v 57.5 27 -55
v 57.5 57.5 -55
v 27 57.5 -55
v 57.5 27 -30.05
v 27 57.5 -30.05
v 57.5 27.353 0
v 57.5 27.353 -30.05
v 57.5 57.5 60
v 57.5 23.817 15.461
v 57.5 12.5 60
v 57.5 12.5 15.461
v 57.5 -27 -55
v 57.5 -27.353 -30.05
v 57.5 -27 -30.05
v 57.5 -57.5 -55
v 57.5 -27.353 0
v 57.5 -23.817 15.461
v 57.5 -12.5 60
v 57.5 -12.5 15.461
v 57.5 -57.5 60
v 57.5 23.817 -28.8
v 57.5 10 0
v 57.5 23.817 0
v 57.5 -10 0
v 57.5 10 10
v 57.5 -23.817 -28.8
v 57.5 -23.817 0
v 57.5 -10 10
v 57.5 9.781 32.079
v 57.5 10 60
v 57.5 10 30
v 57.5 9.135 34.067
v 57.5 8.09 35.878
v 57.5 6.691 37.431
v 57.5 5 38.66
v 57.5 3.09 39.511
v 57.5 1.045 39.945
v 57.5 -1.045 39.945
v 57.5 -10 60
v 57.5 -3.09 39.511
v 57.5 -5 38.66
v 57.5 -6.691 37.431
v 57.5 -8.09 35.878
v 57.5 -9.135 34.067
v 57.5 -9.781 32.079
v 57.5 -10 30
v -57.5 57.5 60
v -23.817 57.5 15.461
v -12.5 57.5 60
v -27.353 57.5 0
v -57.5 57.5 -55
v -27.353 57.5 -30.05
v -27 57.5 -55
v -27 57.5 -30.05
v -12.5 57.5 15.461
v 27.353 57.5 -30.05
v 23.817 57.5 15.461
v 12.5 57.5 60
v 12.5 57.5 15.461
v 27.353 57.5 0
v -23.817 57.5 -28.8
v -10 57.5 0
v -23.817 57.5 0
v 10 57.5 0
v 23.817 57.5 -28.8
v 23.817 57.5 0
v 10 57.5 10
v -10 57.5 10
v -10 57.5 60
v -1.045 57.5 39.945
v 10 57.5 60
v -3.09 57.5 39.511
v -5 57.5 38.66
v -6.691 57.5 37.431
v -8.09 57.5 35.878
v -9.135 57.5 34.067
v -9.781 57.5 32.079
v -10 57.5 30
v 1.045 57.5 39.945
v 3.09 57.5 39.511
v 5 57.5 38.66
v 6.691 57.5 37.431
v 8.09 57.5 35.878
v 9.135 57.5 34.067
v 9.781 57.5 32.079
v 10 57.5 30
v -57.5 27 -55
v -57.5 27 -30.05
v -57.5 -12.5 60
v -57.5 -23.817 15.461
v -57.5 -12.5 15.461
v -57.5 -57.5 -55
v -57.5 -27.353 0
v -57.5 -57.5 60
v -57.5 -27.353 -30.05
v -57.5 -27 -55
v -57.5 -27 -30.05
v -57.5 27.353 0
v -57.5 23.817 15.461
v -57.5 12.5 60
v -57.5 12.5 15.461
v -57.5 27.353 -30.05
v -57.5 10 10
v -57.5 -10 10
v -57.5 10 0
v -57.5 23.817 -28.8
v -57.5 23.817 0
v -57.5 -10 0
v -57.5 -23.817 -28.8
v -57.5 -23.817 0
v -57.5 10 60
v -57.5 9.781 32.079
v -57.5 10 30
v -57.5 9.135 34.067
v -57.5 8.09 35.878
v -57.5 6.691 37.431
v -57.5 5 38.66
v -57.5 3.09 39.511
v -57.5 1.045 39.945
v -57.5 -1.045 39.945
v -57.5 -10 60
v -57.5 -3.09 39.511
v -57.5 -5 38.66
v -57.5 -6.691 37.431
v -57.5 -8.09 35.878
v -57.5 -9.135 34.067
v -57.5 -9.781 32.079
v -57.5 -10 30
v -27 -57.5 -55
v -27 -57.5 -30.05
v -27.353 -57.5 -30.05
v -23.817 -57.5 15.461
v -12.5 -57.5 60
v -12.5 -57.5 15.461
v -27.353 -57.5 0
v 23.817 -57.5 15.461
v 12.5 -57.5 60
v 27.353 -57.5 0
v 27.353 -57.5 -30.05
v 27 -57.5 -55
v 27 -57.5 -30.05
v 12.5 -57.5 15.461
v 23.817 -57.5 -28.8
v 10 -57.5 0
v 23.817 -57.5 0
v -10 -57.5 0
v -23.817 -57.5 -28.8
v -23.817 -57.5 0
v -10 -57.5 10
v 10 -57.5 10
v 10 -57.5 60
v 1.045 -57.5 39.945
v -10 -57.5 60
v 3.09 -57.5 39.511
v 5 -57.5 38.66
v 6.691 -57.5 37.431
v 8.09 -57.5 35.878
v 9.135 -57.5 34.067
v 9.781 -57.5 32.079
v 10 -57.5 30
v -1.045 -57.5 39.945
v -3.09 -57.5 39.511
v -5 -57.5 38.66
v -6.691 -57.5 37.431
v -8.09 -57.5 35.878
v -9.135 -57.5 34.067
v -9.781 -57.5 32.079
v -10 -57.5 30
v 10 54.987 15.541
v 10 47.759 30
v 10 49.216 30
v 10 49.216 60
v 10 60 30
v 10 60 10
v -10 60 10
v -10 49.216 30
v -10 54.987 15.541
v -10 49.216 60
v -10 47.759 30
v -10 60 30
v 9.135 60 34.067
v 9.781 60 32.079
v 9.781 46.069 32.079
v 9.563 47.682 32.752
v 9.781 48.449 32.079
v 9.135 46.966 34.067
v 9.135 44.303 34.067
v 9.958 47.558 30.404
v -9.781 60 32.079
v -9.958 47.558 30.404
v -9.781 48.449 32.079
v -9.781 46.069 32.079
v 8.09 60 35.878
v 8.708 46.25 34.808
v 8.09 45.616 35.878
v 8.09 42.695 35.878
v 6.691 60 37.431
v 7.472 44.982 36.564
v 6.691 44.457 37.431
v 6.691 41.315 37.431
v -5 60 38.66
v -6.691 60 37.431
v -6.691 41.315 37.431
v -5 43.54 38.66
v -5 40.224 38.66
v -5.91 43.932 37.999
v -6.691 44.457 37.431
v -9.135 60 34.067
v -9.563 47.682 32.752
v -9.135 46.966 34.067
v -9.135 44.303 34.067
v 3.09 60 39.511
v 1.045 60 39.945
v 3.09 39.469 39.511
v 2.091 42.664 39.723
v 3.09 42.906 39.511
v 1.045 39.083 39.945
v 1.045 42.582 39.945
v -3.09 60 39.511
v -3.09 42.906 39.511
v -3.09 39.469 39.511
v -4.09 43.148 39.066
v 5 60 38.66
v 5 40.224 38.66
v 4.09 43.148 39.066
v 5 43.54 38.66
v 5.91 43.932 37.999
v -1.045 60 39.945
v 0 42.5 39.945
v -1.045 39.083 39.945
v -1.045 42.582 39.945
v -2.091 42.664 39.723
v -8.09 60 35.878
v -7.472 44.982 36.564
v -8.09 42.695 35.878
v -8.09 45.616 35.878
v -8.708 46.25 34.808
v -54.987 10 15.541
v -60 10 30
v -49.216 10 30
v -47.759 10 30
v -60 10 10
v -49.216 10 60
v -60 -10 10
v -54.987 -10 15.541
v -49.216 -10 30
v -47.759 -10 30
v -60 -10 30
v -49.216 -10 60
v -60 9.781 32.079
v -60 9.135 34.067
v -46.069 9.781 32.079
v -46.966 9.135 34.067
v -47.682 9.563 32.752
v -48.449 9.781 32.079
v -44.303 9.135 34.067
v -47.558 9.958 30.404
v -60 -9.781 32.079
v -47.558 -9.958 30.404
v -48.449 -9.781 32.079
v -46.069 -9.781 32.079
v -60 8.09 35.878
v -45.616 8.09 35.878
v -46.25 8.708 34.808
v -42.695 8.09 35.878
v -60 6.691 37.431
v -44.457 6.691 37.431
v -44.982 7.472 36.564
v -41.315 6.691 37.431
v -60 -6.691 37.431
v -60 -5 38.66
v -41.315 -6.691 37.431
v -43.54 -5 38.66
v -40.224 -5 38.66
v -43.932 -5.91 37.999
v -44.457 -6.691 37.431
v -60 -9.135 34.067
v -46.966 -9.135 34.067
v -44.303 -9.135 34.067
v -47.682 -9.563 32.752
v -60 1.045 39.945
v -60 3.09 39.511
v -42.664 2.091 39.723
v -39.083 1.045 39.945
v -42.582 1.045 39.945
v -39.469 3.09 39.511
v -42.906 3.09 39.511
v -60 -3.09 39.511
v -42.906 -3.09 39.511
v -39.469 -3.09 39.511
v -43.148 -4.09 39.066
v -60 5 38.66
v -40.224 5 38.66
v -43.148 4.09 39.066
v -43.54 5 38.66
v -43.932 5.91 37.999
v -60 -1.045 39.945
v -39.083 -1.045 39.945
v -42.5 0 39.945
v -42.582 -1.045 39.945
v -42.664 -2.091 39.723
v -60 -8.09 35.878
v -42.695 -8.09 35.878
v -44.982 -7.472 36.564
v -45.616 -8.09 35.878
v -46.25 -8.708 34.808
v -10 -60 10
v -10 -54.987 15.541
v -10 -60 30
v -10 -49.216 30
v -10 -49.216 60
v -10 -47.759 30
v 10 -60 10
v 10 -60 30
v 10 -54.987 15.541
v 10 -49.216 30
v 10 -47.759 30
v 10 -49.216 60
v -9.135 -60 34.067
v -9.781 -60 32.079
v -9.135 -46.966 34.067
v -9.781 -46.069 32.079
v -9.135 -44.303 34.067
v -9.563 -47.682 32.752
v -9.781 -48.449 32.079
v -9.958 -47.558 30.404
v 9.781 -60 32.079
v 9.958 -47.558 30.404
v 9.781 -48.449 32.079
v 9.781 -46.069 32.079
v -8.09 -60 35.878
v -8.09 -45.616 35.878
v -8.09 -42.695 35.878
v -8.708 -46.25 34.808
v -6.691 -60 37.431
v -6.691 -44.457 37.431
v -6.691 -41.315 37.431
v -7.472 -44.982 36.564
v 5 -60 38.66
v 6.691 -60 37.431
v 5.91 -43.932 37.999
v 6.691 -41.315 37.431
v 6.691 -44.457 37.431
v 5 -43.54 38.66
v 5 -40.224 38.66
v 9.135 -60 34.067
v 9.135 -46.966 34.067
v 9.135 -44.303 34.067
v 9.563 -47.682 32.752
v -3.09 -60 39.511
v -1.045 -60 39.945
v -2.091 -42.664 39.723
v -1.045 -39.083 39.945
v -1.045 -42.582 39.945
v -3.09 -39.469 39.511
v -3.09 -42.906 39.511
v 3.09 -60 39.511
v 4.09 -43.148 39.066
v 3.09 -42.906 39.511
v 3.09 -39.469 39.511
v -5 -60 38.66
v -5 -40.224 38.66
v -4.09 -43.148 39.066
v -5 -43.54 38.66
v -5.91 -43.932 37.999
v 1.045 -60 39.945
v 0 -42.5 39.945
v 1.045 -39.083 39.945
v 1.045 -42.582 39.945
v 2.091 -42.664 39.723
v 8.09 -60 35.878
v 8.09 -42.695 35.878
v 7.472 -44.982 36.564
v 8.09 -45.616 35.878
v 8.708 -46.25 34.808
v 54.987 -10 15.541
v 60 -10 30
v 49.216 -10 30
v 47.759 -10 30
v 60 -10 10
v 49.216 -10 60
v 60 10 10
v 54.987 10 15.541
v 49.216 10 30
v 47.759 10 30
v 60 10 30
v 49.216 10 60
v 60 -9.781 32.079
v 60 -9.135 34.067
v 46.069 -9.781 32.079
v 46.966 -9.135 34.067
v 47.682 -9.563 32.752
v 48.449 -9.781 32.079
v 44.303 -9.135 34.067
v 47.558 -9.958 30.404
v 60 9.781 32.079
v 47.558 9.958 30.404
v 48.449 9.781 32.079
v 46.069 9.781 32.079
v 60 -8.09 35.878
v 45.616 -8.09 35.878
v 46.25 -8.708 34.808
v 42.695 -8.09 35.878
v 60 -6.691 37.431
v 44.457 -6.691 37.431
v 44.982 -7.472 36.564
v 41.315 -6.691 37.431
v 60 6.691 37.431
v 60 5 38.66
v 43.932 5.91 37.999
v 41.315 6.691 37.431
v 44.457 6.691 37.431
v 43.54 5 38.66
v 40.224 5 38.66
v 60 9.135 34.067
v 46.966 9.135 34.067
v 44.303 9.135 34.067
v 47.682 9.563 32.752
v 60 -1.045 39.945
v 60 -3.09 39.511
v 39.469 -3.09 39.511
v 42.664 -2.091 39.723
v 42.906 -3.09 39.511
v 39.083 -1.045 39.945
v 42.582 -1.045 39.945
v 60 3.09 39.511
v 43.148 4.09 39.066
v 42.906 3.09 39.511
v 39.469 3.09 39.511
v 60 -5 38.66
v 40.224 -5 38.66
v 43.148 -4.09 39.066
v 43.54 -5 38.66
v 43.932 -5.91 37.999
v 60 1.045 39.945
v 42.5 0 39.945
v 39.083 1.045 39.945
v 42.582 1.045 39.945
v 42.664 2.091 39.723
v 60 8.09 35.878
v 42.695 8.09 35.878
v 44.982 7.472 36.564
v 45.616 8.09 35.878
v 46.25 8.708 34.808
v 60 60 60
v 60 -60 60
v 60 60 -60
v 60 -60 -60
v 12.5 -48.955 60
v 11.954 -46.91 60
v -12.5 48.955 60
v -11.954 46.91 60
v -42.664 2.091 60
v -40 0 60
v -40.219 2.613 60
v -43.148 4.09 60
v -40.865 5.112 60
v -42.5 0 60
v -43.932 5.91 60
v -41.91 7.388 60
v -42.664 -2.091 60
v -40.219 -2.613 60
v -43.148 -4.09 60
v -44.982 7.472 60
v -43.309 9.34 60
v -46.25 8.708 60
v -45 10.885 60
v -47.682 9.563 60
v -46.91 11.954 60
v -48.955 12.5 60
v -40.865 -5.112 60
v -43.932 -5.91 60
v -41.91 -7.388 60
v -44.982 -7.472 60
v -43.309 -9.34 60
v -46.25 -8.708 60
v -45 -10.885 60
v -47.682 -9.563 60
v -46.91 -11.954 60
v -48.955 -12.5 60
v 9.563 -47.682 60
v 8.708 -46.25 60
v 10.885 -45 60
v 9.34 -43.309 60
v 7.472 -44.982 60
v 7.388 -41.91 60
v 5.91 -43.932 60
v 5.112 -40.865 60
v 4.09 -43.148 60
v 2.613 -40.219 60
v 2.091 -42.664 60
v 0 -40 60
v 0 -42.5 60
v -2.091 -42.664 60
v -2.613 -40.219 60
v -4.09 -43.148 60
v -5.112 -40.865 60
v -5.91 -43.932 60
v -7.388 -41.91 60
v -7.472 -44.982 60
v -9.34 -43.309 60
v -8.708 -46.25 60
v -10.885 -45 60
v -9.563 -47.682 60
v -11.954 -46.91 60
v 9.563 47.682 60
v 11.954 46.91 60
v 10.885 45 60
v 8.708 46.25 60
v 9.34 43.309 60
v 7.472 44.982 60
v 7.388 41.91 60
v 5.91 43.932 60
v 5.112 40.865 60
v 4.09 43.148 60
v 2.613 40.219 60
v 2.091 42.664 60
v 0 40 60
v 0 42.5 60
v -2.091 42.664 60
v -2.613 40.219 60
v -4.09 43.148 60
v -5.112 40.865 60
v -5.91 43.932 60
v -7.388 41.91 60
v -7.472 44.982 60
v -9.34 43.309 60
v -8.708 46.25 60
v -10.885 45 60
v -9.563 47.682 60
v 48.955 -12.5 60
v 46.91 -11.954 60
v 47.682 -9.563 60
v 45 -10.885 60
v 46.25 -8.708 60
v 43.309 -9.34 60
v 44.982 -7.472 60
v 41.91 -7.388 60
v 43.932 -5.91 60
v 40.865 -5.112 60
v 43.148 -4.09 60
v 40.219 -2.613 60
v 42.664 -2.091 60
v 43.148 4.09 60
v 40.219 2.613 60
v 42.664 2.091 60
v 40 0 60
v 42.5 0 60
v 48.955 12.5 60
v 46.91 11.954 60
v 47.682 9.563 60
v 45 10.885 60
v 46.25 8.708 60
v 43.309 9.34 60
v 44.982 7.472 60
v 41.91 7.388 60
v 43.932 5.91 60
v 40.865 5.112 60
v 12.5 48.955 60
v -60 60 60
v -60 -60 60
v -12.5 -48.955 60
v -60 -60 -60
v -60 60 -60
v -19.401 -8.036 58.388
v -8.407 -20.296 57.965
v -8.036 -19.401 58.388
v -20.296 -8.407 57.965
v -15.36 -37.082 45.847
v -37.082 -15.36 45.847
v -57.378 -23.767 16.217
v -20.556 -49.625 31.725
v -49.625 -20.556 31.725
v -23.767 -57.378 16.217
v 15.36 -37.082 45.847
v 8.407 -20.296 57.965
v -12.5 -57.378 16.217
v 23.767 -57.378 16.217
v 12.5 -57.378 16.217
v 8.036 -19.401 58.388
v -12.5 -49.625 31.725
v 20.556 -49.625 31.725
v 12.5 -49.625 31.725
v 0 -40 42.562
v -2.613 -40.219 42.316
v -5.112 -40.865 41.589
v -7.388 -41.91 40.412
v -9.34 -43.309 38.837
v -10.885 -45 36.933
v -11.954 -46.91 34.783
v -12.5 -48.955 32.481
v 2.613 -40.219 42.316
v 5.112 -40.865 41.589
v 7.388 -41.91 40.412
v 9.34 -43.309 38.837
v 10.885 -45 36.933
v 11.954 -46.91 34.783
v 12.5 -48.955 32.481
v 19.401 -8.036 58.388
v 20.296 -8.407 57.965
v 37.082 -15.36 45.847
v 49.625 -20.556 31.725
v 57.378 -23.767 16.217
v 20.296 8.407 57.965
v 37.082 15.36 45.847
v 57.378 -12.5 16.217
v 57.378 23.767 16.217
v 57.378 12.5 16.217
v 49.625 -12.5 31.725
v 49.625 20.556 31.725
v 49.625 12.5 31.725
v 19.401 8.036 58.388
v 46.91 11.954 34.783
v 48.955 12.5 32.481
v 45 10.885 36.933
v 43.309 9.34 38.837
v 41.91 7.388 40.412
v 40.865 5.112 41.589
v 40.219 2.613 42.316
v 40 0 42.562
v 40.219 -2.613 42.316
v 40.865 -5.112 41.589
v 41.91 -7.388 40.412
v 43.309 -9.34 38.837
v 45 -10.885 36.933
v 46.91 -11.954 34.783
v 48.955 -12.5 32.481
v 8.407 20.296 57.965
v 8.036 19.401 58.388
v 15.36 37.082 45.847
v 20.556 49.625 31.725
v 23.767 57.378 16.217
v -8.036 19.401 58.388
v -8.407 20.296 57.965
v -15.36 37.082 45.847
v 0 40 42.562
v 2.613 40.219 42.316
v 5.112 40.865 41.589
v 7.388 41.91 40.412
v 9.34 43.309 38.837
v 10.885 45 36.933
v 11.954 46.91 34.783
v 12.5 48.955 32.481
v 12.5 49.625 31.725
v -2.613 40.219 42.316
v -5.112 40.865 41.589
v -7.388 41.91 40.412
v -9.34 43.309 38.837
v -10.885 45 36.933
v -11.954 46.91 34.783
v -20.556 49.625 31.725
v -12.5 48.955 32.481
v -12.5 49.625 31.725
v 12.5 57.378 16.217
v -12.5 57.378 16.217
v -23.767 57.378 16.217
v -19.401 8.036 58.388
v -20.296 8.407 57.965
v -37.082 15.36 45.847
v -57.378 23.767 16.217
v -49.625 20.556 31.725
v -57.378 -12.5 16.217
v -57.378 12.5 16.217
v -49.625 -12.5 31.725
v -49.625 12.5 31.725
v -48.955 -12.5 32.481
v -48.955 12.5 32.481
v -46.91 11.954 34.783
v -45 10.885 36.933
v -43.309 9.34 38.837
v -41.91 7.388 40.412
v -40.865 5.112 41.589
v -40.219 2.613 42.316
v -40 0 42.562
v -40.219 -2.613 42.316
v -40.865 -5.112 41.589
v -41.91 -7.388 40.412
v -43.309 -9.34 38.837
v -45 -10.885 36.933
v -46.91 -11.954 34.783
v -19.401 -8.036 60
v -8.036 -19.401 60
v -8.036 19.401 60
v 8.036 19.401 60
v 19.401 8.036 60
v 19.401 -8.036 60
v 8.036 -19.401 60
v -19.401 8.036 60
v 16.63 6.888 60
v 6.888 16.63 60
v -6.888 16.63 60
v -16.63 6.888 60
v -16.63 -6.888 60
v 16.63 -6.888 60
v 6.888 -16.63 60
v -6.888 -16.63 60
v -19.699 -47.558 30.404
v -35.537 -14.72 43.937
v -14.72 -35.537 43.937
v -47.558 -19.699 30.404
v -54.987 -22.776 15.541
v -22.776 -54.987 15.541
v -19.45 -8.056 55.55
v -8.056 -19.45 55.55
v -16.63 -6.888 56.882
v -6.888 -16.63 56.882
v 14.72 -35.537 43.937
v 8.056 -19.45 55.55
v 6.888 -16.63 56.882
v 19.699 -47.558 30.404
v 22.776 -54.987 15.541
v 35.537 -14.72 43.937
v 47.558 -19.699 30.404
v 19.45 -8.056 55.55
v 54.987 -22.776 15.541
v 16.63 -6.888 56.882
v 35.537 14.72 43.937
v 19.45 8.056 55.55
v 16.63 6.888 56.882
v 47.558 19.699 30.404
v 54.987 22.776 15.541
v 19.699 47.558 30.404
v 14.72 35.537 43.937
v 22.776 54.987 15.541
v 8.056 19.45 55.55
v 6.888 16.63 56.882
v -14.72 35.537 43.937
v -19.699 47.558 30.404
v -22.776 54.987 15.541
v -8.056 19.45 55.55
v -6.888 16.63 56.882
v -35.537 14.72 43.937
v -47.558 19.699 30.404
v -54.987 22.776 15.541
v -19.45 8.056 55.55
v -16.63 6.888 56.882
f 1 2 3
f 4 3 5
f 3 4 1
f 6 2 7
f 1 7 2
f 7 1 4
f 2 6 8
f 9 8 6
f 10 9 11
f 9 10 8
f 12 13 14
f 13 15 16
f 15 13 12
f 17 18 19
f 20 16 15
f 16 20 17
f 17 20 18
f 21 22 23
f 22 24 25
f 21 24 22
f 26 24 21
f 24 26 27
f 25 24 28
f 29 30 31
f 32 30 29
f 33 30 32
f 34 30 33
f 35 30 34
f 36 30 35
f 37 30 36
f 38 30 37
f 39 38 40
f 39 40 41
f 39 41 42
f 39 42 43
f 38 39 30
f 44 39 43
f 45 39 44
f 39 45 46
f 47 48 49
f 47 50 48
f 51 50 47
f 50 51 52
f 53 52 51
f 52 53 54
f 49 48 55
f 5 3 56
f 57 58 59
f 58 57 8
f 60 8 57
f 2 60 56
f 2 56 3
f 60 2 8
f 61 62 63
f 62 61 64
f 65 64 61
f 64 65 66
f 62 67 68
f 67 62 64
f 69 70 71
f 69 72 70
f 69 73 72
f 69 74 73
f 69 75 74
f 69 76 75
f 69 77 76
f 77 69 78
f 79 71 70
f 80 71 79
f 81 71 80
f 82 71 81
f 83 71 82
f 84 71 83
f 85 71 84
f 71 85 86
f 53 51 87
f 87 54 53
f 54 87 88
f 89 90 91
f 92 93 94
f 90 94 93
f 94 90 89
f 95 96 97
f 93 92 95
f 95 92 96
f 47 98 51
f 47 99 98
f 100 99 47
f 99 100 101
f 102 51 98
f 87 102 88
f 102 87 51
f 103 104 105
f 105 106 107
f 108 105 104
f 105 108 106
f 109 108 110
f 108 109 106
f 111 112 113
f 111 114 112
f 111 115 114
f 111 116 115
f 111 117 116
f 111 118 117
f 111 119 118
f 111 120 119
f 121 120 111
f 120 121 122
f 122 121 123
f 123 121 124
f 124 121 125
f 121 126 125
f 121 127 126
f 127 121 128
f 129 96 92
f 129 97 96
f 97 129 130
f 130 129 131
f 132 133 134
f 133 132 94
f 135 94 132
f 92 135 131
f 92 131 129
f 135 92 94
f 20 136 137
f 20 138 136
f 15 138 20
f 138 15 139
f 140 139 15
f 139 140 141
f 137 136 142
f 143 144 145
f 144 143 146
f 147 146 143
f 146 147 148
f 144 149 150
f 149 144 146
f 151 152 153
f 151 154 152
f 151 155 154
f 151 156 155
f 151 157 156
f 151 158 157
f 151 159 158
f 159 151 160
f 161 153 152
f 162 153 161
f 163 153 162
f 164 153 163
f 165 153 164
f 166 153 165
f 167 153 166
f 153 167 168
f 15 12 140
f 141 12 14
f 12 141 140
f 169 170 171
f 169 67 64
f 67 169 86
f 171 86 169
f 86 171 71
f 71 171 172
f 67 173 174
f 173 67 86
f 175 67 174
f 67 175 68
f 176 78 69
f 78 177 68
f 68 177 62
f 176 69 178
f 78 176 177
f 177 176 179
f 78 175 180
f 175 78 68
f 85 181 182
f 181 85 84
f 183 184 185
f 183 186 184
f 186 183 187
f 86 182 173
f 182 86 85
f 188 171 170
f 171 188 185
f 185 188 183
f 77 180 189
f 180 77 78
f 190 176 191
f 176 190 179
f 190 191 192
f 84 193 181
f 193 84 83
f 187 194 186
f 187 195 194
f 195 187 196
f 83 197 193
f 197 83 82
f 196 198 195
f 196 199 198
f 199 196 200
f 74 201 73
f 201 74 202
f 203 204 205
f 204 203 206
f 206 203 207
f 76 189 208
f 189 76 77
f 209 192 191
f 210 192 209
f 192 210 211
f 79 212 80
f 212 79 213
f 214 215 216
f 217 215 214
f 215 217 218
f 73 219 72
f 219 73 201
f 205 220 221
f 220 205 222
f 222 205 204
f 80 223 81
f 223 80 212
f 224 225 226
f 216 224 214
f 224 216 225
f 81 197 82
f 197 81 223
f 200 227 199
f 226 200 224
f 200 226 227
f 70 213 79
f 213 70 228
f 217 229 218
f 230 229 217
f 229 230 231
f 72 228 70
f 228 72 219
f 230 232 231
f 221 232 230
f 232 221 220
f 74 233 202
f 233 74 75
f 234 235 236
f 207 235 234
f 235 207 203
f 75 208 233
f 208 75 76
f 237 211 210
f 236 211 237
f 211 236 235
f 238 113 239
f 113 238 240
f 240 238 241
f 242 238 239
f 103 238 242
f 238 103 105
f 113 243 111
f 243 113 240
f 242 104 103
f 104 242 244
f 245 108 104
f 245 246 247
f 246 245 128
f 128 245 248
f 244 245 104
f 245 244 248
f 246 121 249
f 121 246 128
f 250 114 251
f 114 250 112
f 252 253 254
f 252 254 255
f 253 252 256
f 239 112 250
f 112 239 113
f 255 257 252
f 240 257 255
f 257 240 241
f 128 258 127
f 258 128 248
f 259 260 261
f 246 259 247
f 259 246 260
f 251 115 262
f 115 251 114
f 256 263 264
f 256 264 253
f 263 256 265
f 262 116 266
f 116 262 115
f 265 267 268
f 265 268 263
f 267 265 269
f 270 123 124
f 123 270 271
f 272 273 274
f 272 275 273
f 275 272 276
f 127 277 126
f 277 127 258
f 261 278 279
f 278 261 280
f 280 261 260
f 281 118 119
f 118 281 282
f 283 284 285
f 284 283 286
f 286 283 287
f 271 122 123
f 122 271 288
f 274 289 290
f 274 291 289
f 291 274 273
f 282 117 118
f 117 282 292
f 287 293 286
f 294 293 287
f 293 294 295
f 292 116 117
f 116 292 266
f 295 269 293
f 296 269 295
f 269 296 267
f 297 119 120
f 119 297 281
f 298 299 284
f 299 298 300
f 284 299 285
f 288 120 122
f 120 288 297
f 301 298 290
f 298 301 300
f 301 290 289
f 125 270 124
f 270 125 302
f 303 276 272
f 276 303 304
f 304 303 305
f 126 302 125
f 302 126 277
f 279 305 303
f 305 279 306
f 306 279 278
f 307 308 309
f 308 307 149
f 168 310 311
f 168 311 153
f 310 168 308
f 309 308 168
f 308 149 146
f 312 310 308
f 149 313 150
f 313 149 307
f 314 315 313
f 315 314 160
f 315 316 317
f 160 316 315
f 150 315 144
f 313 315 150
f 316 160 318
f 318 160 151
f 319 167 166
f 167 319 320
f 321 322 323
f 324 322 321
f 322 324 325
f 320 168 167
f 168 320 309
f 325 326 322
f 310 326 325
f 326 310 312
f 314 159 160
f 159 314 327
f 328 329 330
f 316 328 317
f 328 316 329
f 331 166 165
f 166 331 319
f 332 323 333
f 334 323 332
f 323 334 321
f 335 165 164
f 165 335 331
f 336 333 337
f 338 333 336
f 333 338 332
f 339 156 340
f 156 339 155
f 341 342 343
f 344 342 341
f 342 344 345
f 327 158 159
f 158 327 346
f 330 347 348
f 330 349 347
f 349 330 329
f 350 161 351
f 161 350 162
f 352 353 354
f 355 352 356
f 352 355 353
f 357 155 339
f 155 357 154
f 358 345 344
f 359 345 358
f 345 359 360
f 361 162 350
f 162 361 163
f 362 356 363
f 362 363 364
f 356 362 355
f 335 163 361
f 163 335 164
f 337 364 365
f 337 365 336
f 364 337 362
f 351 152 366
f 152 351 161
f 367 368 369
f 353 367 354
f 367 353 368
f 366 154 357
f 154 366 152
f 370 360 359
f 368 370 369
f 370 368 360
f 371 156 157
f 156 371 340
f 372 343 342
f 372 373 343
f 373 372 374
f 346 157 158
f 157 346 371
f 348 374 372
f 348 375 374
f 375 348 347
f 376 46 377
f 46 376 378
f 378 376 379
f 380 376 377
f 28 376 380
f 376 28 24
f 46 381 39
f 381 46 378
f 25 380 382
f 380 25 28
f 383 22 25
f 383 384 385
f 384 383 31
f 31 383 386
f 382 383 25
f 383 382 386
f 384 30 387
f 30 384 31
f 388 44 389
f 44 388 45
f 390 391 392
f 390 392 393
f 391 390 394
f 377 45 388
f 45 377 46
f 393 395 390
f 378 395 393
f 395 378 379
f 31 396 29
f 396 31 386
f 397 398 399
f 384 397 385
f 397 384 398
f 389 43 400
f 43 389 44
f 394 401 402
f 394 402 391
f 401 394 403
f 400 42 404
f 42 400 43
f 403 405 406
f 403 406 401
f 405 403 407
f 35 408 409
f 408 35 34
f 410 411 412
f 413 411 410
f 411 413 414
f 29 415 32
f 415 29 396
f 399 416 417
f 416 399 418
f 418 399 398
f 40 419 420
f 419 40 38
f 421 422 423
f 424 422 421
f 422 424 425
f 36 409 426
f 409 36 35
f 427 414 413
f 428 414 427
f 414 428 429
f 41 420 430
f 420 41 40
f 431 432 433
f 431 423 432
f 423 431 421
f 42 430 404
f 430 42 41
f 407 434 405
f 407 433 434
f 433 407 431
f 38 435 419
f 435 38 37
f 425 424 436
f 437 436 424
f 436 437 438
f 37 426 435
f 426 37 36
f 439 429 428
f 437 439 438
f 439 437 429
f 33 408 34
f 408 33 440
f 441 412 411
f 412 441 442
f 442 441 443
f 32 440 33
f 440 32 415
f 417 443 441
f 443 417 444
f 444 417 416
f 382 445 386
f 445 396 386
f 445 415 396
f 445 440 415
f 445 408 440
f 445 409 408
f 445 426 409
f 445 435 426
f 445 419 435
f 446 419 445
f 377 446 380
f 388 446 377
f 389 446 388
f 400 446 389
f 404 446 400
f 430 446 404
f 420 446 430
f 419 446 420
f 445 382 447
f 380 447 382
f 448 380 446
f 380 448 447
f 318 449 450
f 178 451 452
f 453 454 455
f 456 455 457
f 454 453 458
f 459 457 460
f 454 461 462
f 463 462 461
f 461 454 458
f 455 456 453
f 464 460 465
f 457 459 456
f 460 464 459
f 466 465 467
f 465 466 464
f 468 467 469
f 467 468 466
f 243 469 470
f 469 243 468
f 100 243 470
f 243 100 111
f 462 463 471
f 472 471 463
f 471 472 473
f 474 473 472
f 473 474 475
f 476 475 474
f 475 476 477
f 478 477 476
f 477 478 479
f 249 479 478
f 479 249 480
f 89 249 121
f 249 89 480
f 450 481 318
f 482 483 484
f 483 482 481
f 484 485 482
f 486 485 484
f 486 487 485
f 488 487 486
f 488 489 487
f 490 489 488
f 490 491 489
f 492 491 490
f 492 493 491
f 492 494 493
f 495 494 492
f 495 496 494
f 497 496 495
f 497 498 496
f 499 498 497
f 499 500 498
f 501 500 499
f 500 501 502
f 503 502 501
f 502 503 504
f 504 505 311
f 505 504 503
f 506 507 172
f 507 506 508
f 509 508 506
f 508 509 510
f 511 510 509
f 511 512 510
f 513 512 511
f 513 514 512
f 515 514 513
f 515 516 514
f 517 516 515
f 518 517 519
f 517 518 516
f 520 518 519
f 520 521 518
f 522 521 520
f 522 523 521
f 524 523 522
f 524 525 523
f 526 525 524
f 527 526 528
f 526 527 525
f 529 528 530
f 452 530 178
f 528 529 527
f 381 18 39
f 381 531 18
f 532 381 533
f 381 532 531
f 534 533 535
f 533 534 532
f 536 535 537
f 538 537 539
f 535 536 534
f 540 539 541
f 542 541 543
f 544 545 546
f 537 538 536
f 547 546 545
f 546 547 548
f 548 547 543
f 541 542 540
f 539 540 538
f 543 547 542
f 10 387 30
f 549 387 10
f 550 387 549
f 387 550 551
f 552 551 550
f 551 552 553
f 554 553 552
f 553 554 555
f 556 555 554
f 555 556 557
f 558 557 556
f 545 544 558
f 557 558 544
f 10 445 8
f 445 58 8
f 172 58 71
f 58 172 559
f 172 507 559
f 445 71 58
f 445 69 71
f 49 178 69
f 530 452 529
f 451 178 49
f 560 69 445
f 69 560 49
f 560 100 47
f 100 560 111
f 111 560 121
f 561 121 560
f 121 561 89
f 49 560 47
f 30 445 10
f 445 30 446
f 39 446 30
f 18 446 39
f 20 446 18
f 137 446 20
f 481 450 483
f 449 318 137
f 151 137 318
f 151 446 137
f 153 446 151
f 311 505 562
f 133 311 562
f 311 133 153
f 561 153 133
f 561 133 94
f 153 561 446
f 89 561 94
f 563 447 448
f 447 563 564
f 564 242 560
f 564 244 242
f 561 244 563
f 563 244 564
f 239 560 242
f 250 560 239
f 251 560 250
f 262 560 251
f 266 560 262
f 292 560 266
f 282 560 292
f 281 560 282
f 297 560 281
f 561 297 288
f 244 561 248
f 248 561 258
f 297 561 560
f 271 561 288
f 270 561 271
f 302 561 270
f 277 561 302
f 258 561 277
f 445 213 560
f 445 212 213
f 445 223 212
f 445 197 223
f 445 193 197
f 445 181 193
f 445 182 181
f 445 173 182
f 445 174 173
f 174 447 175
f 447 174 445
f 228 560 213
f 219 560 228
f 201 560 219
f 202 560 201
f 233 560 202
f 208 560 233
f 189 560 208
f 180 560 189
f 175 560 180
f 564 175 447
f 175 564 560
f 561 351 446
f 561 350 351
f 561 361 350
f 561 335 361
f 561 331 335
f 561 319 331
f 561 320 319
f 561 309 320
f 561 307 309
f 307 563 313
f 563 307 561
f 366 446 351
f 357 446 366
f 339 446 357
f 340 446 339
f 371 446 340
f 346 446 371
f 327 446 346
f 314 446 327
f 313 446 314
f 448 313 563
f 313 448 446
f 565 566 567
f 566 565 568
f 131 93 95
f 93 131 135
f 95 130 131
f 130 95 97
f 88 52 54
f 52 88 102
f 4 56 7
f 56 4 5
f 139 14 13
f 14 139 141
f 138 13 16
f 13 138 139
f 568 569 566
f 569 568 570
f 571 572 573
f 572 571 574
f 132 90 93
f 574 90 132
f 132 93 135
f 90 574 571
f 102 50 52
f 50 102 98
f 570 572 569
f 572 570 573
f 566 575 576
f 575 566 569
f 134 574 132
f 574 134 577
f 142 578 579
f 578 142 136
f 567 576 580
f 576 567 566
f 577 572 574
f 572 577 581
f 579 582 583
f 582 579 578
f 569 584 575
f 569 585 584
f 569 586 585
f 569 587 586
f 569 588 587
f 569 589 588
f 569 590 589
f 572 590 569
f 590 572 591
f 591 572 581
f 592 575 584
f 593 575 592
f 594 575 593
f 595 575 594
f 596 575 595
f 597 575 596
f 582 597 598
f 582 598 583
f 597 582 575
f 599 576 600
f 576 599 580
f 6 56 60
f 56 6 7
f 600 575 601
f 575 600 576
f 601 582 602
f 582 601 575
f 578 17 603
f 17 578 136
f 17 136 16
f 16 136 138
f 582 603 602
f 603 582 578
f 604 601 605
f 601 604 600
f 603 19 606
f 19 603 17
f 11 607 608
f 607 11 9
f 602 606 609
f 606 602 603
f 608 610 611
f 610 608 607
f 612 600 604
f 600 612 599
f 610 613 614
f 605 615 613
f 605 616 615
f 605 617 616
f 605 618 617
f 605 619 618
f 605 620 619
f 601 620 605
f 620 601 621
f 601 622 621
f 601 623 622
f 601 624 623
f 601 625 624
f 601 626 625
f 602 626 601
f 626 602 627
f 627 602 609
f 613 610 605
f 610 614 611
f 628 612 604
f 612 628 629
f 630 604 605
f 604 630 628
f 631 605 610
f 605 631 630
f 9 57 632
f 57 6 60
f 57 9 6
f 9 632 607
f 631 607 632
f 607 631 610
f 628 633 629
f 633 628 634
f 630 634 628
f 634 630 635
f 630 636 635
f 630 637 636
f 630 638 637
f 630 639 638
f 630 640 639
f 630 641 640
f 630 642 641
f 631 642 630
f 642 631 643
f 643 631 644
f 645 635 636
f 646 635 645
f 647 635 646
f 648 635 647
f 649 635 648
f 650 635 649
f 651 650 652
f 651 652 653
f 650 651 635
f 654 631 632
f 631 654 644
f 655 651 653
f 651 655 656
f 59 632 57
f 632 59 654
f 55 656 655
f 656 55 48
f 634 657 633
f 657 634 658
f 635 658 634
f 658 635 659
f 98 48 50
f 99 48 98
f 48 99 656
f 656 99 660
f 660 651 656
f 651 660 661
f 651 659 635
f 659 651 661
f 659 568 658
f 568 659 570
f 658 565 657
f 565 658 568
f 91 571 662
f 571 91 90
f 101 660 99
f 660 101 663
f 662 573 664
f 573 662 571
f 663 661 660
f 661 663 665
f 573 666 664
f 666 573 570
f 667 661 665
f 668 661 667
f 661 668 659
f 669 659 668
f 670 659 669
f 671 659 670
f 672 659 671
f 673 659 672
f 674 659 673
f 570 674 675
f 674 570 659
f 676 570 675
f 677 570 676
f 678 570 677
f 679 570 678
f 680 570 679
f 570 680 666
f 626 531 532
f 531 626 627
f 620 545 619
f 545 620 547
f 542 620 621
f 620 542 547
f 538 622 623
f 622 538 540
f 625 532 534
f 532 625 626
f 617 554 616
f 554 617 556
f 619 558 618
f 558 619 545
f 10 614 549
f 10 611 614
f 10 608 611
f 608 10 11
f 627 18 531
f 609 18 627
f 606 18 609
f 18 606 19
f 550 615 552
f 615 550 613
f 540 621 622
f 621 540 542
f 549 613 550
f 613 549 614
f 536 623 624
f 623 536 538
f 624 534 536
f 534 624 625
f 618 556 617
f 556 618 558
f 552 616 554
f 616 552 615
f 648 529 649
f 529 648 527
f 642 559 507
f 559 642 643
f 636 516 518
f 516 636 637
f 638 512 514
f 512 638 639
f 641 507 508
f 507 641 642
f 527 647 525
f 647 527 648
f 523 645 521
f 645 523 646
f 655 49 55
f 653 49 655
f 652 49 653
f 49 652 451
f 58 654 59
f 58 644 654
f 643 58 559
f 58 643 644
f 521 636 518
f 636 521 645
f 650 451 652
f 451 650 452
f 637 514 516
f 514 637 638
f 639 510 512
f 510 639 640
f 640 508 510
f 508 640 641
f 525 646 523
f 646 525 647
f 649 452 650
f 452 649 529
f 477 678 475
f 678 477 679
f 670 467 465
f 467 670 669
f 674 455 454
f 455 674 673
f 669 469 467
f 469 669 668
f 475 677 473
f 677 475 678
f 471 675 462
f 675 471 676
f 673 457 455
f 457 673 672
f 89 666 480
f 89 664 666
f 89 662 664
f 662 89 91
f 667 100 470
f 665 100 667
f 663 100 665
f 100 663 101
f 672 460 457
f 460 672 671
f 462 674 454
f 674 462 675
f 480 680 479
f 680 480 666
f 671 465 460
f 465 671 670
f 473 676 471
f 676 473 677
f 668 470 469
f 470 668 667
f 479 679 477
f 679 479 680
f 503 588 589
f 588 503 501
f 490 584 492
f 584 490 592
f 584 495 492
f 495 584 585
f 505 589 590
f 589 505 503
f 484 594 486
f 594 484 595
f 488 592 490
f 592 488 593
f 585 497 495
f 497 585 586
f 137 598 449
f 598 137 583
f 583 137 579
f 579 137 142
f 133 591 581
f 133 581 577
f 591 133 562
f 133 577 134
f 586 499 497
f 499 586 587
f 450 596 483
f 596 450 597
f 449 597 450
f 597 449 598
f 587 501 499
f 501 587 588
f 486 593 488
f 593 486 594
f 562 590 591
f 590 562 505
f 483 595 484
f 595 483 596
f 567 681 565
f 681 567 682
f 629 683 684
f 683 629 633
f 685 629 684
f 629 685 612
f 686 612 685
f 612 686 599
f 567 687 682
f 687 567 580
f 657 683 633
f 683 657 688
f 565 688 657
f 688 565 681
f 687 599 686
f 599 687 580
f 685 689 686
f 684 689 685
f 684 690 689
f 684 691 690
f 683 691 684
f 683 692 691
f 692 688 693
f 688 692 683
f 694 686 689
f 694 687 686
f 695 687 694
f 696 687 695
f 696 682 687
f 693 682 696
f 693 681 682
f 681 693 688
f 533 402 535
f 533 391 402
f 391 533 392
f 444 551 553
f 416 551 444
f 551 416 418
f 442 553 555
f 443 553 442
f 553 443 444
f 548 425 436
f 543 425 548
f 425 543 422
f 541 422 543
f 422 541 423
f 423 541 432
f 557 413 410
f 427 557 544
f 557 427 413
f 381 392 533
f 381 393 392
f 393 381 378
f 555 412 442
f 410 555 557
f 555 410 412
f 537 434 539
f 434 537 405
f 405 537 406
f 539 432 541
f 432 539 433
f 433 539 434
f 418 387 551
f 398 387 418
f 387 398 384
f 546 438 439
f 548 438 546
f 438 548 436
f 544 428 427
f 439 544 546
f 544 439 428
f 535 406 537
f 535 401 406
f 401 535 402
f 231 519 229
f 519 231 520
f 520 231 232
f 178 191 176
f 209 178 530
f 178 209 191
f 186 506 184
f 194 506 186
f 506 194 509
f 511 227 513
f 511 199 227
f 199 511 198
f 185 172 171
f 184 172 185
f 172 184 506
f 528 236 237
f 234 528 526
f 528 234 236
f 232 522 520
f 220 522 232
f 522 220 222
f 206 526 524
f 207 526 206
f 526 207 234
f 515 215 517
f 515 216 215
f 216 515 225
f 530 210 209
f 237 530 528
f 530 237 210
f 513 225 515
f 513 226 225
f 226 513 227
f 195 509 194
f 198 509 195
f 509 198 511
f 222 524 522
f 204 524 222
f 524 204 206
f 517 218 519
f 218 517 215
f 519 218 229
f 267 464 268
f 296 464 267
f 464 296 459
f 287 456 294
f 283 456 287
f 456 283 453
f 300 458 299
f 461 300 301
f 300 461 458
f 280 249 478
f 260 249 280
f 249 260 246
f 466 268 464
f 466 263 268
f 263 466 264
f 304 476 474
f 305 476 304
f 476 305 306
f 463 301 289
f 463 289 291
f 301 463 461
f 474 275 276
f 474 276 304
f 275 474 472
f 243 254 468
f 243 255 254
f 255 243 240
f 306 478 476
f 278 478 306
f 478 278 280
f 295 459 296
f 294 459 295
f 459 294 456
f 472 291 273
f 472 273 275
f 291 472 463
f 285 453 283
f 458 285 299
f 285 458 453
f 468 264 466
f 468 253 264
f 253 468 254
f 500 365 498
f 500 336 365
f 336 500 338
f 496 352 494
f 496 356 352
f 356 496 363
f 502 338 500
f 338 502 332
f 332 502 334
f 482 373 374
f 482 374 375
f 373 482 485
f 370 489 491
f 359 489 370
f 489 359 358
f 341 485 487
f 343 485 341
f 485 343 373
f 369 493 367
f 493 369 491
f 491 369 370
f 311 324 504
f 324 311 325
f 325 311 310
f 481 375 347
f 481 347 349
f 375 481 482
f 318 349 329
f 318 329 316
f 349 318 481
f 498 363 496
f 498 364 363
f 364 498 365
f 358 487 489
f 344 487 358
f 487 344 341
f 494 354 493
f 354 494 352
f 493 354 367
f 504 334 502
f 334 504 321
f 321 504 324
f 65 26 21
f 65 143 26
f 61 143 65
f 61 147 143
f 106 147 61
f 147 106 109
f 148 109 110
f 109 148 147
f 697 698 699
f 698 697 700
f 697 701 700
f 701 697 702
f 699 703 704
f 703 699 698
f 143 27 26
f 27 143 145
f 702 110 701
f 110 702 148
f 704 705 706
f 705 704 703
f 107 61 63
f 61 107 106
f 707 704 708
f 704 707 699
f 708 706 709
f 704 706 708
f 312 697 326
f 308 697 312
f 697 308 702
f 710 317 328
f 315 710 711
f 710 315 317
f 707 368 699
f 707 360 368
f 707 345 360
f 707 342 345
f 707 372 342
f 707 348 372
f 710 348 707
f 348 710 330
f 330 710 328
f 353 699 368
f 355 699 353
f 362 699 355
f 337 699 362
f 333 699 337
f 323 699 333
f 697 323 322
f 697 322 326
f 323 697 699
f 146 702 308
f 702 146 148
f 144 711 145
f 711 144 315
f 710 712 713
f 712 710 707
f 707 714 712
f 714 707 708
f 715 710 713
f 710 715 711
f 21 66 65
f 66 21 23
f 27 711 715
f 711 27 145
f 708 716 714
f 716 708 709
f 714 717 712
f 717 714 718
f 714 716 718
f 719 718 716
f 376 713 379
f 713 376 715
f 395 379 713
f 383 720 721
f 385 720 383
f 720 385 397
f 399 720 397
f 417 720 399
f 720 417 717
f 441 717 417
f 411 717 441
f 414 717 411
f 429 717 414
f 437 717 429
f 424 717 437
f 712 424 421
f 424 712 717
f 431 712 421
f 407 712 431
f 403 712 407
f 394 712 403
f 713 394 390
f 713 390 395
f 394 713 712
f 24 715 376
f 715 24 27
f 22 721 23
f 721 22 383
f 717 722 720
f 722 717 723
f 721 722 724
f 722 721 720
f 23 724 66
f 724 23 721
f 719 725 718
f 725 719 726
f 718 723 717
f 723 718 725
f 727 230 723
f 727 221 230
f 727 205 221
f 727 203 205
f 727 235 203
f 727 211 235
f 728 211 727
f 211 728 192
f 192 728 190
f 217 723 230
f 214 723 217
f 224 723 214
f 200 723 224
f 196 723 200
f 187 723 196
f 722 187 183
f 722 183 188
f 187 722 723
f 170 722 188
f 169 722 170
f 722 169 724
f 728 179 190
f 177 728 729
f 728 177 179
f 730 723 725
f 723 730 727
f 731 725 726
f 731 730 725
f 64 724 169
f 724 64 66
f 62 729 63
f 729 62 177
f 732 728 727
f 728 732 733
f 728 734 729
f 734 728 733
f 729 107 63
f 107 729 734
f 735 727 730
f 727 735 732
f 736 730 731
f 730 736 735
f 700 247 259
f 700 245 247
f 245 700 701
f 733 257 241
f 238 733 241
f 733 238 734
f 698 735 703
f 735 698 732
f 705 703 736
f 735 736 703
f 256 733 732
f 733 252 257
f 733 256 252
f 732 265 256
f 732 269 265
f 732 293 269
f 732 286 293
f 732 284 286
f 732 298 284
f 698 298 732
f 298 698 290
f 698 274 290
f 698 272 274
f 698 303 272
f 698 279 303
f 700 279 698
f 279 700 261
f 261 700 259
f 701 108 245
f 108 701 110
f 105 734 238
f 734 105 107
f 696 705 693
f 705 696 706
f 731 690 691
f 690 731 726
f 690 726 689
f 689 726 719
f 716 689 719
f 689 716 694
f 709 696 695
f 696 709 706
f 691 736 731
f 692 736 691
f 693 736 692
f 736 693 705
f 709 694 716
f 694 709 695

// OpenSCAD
// 1 cm = 1 meter

//$fn = 60;

 
difference(){
    cube([120, 120, 120], true);                                // Quader
    translate([0, 0, 25]) cube([115, 115, 110], true);            
    for (i=[0:90:270]) rotate([0, 0, i]) translate([0, 0, 5])   // Dreiecke ausschneiden
        linear_extrude(120, center=true) polygon([[57.5, 27],[57.5, 57.5],[27, 57.5]]);
    tueren();                                                   // Türen
    //rotate([0, 0, 45])
    //translate([0, -60,0]) color("blue") cube([150, 120, 150], true);
};


difference(){
    union(){
        kuppel(120);                                               // Kupel
        oberlicht(offs = 5);
    rotate([0, 0, 22.5]) cylinder(60, 21, 21, center=false, $fn=8);
    };
    translate([0, 0, 5])oberlicht(offs = 0);
    kuppel(115); 
    rotate([0, 0, 22.5]) cylinder(120, 18, 18, center=false, $fn=8);    // Dachluke
    tueren();                                                   // Türen
    //rotate([0, 0, 45])
    //translate([0, -60,0]) color("blue") cube([150, 120, 150], true);
}


module tueren()
for (i=[0:90:270]) rotate([0, 0, i]) {
    translate([0, 60, 20]) cube([20, 30, 20], true);
    translate([0, 60, 30]) rotate([90, 0, 0]) cylinder(50, 10, 10, true);
};
  
module kuppel(w)
intersection_for(n = [1 : 8]){
    rotate([0, 0, n * 45])
    hull() {
        intersection(){
            translate([w/2, 0, 0])scale([1, 1, 0.65])rotate([90, 0, 0]) cylinder(w, w, w, true);
            translate([0, 0, w*0.25])cube([2*w, 2*w, w*0.75], true);
        };
        translate([0, 0, -w/4])cube([w, w, 0.1], true);
    }
}

module oberlicht(offs = 0)
for (i=[0:90:270]) rotate([0, 0, i]) translate([0, 0, 15])
    hull() linear_extrude(90, center=true) {
        translate([50, 0])resize([15 + offs, 20 + offs])circle(10); 
        translate([55, 0])square([5, 20 + offs], true);
    }
